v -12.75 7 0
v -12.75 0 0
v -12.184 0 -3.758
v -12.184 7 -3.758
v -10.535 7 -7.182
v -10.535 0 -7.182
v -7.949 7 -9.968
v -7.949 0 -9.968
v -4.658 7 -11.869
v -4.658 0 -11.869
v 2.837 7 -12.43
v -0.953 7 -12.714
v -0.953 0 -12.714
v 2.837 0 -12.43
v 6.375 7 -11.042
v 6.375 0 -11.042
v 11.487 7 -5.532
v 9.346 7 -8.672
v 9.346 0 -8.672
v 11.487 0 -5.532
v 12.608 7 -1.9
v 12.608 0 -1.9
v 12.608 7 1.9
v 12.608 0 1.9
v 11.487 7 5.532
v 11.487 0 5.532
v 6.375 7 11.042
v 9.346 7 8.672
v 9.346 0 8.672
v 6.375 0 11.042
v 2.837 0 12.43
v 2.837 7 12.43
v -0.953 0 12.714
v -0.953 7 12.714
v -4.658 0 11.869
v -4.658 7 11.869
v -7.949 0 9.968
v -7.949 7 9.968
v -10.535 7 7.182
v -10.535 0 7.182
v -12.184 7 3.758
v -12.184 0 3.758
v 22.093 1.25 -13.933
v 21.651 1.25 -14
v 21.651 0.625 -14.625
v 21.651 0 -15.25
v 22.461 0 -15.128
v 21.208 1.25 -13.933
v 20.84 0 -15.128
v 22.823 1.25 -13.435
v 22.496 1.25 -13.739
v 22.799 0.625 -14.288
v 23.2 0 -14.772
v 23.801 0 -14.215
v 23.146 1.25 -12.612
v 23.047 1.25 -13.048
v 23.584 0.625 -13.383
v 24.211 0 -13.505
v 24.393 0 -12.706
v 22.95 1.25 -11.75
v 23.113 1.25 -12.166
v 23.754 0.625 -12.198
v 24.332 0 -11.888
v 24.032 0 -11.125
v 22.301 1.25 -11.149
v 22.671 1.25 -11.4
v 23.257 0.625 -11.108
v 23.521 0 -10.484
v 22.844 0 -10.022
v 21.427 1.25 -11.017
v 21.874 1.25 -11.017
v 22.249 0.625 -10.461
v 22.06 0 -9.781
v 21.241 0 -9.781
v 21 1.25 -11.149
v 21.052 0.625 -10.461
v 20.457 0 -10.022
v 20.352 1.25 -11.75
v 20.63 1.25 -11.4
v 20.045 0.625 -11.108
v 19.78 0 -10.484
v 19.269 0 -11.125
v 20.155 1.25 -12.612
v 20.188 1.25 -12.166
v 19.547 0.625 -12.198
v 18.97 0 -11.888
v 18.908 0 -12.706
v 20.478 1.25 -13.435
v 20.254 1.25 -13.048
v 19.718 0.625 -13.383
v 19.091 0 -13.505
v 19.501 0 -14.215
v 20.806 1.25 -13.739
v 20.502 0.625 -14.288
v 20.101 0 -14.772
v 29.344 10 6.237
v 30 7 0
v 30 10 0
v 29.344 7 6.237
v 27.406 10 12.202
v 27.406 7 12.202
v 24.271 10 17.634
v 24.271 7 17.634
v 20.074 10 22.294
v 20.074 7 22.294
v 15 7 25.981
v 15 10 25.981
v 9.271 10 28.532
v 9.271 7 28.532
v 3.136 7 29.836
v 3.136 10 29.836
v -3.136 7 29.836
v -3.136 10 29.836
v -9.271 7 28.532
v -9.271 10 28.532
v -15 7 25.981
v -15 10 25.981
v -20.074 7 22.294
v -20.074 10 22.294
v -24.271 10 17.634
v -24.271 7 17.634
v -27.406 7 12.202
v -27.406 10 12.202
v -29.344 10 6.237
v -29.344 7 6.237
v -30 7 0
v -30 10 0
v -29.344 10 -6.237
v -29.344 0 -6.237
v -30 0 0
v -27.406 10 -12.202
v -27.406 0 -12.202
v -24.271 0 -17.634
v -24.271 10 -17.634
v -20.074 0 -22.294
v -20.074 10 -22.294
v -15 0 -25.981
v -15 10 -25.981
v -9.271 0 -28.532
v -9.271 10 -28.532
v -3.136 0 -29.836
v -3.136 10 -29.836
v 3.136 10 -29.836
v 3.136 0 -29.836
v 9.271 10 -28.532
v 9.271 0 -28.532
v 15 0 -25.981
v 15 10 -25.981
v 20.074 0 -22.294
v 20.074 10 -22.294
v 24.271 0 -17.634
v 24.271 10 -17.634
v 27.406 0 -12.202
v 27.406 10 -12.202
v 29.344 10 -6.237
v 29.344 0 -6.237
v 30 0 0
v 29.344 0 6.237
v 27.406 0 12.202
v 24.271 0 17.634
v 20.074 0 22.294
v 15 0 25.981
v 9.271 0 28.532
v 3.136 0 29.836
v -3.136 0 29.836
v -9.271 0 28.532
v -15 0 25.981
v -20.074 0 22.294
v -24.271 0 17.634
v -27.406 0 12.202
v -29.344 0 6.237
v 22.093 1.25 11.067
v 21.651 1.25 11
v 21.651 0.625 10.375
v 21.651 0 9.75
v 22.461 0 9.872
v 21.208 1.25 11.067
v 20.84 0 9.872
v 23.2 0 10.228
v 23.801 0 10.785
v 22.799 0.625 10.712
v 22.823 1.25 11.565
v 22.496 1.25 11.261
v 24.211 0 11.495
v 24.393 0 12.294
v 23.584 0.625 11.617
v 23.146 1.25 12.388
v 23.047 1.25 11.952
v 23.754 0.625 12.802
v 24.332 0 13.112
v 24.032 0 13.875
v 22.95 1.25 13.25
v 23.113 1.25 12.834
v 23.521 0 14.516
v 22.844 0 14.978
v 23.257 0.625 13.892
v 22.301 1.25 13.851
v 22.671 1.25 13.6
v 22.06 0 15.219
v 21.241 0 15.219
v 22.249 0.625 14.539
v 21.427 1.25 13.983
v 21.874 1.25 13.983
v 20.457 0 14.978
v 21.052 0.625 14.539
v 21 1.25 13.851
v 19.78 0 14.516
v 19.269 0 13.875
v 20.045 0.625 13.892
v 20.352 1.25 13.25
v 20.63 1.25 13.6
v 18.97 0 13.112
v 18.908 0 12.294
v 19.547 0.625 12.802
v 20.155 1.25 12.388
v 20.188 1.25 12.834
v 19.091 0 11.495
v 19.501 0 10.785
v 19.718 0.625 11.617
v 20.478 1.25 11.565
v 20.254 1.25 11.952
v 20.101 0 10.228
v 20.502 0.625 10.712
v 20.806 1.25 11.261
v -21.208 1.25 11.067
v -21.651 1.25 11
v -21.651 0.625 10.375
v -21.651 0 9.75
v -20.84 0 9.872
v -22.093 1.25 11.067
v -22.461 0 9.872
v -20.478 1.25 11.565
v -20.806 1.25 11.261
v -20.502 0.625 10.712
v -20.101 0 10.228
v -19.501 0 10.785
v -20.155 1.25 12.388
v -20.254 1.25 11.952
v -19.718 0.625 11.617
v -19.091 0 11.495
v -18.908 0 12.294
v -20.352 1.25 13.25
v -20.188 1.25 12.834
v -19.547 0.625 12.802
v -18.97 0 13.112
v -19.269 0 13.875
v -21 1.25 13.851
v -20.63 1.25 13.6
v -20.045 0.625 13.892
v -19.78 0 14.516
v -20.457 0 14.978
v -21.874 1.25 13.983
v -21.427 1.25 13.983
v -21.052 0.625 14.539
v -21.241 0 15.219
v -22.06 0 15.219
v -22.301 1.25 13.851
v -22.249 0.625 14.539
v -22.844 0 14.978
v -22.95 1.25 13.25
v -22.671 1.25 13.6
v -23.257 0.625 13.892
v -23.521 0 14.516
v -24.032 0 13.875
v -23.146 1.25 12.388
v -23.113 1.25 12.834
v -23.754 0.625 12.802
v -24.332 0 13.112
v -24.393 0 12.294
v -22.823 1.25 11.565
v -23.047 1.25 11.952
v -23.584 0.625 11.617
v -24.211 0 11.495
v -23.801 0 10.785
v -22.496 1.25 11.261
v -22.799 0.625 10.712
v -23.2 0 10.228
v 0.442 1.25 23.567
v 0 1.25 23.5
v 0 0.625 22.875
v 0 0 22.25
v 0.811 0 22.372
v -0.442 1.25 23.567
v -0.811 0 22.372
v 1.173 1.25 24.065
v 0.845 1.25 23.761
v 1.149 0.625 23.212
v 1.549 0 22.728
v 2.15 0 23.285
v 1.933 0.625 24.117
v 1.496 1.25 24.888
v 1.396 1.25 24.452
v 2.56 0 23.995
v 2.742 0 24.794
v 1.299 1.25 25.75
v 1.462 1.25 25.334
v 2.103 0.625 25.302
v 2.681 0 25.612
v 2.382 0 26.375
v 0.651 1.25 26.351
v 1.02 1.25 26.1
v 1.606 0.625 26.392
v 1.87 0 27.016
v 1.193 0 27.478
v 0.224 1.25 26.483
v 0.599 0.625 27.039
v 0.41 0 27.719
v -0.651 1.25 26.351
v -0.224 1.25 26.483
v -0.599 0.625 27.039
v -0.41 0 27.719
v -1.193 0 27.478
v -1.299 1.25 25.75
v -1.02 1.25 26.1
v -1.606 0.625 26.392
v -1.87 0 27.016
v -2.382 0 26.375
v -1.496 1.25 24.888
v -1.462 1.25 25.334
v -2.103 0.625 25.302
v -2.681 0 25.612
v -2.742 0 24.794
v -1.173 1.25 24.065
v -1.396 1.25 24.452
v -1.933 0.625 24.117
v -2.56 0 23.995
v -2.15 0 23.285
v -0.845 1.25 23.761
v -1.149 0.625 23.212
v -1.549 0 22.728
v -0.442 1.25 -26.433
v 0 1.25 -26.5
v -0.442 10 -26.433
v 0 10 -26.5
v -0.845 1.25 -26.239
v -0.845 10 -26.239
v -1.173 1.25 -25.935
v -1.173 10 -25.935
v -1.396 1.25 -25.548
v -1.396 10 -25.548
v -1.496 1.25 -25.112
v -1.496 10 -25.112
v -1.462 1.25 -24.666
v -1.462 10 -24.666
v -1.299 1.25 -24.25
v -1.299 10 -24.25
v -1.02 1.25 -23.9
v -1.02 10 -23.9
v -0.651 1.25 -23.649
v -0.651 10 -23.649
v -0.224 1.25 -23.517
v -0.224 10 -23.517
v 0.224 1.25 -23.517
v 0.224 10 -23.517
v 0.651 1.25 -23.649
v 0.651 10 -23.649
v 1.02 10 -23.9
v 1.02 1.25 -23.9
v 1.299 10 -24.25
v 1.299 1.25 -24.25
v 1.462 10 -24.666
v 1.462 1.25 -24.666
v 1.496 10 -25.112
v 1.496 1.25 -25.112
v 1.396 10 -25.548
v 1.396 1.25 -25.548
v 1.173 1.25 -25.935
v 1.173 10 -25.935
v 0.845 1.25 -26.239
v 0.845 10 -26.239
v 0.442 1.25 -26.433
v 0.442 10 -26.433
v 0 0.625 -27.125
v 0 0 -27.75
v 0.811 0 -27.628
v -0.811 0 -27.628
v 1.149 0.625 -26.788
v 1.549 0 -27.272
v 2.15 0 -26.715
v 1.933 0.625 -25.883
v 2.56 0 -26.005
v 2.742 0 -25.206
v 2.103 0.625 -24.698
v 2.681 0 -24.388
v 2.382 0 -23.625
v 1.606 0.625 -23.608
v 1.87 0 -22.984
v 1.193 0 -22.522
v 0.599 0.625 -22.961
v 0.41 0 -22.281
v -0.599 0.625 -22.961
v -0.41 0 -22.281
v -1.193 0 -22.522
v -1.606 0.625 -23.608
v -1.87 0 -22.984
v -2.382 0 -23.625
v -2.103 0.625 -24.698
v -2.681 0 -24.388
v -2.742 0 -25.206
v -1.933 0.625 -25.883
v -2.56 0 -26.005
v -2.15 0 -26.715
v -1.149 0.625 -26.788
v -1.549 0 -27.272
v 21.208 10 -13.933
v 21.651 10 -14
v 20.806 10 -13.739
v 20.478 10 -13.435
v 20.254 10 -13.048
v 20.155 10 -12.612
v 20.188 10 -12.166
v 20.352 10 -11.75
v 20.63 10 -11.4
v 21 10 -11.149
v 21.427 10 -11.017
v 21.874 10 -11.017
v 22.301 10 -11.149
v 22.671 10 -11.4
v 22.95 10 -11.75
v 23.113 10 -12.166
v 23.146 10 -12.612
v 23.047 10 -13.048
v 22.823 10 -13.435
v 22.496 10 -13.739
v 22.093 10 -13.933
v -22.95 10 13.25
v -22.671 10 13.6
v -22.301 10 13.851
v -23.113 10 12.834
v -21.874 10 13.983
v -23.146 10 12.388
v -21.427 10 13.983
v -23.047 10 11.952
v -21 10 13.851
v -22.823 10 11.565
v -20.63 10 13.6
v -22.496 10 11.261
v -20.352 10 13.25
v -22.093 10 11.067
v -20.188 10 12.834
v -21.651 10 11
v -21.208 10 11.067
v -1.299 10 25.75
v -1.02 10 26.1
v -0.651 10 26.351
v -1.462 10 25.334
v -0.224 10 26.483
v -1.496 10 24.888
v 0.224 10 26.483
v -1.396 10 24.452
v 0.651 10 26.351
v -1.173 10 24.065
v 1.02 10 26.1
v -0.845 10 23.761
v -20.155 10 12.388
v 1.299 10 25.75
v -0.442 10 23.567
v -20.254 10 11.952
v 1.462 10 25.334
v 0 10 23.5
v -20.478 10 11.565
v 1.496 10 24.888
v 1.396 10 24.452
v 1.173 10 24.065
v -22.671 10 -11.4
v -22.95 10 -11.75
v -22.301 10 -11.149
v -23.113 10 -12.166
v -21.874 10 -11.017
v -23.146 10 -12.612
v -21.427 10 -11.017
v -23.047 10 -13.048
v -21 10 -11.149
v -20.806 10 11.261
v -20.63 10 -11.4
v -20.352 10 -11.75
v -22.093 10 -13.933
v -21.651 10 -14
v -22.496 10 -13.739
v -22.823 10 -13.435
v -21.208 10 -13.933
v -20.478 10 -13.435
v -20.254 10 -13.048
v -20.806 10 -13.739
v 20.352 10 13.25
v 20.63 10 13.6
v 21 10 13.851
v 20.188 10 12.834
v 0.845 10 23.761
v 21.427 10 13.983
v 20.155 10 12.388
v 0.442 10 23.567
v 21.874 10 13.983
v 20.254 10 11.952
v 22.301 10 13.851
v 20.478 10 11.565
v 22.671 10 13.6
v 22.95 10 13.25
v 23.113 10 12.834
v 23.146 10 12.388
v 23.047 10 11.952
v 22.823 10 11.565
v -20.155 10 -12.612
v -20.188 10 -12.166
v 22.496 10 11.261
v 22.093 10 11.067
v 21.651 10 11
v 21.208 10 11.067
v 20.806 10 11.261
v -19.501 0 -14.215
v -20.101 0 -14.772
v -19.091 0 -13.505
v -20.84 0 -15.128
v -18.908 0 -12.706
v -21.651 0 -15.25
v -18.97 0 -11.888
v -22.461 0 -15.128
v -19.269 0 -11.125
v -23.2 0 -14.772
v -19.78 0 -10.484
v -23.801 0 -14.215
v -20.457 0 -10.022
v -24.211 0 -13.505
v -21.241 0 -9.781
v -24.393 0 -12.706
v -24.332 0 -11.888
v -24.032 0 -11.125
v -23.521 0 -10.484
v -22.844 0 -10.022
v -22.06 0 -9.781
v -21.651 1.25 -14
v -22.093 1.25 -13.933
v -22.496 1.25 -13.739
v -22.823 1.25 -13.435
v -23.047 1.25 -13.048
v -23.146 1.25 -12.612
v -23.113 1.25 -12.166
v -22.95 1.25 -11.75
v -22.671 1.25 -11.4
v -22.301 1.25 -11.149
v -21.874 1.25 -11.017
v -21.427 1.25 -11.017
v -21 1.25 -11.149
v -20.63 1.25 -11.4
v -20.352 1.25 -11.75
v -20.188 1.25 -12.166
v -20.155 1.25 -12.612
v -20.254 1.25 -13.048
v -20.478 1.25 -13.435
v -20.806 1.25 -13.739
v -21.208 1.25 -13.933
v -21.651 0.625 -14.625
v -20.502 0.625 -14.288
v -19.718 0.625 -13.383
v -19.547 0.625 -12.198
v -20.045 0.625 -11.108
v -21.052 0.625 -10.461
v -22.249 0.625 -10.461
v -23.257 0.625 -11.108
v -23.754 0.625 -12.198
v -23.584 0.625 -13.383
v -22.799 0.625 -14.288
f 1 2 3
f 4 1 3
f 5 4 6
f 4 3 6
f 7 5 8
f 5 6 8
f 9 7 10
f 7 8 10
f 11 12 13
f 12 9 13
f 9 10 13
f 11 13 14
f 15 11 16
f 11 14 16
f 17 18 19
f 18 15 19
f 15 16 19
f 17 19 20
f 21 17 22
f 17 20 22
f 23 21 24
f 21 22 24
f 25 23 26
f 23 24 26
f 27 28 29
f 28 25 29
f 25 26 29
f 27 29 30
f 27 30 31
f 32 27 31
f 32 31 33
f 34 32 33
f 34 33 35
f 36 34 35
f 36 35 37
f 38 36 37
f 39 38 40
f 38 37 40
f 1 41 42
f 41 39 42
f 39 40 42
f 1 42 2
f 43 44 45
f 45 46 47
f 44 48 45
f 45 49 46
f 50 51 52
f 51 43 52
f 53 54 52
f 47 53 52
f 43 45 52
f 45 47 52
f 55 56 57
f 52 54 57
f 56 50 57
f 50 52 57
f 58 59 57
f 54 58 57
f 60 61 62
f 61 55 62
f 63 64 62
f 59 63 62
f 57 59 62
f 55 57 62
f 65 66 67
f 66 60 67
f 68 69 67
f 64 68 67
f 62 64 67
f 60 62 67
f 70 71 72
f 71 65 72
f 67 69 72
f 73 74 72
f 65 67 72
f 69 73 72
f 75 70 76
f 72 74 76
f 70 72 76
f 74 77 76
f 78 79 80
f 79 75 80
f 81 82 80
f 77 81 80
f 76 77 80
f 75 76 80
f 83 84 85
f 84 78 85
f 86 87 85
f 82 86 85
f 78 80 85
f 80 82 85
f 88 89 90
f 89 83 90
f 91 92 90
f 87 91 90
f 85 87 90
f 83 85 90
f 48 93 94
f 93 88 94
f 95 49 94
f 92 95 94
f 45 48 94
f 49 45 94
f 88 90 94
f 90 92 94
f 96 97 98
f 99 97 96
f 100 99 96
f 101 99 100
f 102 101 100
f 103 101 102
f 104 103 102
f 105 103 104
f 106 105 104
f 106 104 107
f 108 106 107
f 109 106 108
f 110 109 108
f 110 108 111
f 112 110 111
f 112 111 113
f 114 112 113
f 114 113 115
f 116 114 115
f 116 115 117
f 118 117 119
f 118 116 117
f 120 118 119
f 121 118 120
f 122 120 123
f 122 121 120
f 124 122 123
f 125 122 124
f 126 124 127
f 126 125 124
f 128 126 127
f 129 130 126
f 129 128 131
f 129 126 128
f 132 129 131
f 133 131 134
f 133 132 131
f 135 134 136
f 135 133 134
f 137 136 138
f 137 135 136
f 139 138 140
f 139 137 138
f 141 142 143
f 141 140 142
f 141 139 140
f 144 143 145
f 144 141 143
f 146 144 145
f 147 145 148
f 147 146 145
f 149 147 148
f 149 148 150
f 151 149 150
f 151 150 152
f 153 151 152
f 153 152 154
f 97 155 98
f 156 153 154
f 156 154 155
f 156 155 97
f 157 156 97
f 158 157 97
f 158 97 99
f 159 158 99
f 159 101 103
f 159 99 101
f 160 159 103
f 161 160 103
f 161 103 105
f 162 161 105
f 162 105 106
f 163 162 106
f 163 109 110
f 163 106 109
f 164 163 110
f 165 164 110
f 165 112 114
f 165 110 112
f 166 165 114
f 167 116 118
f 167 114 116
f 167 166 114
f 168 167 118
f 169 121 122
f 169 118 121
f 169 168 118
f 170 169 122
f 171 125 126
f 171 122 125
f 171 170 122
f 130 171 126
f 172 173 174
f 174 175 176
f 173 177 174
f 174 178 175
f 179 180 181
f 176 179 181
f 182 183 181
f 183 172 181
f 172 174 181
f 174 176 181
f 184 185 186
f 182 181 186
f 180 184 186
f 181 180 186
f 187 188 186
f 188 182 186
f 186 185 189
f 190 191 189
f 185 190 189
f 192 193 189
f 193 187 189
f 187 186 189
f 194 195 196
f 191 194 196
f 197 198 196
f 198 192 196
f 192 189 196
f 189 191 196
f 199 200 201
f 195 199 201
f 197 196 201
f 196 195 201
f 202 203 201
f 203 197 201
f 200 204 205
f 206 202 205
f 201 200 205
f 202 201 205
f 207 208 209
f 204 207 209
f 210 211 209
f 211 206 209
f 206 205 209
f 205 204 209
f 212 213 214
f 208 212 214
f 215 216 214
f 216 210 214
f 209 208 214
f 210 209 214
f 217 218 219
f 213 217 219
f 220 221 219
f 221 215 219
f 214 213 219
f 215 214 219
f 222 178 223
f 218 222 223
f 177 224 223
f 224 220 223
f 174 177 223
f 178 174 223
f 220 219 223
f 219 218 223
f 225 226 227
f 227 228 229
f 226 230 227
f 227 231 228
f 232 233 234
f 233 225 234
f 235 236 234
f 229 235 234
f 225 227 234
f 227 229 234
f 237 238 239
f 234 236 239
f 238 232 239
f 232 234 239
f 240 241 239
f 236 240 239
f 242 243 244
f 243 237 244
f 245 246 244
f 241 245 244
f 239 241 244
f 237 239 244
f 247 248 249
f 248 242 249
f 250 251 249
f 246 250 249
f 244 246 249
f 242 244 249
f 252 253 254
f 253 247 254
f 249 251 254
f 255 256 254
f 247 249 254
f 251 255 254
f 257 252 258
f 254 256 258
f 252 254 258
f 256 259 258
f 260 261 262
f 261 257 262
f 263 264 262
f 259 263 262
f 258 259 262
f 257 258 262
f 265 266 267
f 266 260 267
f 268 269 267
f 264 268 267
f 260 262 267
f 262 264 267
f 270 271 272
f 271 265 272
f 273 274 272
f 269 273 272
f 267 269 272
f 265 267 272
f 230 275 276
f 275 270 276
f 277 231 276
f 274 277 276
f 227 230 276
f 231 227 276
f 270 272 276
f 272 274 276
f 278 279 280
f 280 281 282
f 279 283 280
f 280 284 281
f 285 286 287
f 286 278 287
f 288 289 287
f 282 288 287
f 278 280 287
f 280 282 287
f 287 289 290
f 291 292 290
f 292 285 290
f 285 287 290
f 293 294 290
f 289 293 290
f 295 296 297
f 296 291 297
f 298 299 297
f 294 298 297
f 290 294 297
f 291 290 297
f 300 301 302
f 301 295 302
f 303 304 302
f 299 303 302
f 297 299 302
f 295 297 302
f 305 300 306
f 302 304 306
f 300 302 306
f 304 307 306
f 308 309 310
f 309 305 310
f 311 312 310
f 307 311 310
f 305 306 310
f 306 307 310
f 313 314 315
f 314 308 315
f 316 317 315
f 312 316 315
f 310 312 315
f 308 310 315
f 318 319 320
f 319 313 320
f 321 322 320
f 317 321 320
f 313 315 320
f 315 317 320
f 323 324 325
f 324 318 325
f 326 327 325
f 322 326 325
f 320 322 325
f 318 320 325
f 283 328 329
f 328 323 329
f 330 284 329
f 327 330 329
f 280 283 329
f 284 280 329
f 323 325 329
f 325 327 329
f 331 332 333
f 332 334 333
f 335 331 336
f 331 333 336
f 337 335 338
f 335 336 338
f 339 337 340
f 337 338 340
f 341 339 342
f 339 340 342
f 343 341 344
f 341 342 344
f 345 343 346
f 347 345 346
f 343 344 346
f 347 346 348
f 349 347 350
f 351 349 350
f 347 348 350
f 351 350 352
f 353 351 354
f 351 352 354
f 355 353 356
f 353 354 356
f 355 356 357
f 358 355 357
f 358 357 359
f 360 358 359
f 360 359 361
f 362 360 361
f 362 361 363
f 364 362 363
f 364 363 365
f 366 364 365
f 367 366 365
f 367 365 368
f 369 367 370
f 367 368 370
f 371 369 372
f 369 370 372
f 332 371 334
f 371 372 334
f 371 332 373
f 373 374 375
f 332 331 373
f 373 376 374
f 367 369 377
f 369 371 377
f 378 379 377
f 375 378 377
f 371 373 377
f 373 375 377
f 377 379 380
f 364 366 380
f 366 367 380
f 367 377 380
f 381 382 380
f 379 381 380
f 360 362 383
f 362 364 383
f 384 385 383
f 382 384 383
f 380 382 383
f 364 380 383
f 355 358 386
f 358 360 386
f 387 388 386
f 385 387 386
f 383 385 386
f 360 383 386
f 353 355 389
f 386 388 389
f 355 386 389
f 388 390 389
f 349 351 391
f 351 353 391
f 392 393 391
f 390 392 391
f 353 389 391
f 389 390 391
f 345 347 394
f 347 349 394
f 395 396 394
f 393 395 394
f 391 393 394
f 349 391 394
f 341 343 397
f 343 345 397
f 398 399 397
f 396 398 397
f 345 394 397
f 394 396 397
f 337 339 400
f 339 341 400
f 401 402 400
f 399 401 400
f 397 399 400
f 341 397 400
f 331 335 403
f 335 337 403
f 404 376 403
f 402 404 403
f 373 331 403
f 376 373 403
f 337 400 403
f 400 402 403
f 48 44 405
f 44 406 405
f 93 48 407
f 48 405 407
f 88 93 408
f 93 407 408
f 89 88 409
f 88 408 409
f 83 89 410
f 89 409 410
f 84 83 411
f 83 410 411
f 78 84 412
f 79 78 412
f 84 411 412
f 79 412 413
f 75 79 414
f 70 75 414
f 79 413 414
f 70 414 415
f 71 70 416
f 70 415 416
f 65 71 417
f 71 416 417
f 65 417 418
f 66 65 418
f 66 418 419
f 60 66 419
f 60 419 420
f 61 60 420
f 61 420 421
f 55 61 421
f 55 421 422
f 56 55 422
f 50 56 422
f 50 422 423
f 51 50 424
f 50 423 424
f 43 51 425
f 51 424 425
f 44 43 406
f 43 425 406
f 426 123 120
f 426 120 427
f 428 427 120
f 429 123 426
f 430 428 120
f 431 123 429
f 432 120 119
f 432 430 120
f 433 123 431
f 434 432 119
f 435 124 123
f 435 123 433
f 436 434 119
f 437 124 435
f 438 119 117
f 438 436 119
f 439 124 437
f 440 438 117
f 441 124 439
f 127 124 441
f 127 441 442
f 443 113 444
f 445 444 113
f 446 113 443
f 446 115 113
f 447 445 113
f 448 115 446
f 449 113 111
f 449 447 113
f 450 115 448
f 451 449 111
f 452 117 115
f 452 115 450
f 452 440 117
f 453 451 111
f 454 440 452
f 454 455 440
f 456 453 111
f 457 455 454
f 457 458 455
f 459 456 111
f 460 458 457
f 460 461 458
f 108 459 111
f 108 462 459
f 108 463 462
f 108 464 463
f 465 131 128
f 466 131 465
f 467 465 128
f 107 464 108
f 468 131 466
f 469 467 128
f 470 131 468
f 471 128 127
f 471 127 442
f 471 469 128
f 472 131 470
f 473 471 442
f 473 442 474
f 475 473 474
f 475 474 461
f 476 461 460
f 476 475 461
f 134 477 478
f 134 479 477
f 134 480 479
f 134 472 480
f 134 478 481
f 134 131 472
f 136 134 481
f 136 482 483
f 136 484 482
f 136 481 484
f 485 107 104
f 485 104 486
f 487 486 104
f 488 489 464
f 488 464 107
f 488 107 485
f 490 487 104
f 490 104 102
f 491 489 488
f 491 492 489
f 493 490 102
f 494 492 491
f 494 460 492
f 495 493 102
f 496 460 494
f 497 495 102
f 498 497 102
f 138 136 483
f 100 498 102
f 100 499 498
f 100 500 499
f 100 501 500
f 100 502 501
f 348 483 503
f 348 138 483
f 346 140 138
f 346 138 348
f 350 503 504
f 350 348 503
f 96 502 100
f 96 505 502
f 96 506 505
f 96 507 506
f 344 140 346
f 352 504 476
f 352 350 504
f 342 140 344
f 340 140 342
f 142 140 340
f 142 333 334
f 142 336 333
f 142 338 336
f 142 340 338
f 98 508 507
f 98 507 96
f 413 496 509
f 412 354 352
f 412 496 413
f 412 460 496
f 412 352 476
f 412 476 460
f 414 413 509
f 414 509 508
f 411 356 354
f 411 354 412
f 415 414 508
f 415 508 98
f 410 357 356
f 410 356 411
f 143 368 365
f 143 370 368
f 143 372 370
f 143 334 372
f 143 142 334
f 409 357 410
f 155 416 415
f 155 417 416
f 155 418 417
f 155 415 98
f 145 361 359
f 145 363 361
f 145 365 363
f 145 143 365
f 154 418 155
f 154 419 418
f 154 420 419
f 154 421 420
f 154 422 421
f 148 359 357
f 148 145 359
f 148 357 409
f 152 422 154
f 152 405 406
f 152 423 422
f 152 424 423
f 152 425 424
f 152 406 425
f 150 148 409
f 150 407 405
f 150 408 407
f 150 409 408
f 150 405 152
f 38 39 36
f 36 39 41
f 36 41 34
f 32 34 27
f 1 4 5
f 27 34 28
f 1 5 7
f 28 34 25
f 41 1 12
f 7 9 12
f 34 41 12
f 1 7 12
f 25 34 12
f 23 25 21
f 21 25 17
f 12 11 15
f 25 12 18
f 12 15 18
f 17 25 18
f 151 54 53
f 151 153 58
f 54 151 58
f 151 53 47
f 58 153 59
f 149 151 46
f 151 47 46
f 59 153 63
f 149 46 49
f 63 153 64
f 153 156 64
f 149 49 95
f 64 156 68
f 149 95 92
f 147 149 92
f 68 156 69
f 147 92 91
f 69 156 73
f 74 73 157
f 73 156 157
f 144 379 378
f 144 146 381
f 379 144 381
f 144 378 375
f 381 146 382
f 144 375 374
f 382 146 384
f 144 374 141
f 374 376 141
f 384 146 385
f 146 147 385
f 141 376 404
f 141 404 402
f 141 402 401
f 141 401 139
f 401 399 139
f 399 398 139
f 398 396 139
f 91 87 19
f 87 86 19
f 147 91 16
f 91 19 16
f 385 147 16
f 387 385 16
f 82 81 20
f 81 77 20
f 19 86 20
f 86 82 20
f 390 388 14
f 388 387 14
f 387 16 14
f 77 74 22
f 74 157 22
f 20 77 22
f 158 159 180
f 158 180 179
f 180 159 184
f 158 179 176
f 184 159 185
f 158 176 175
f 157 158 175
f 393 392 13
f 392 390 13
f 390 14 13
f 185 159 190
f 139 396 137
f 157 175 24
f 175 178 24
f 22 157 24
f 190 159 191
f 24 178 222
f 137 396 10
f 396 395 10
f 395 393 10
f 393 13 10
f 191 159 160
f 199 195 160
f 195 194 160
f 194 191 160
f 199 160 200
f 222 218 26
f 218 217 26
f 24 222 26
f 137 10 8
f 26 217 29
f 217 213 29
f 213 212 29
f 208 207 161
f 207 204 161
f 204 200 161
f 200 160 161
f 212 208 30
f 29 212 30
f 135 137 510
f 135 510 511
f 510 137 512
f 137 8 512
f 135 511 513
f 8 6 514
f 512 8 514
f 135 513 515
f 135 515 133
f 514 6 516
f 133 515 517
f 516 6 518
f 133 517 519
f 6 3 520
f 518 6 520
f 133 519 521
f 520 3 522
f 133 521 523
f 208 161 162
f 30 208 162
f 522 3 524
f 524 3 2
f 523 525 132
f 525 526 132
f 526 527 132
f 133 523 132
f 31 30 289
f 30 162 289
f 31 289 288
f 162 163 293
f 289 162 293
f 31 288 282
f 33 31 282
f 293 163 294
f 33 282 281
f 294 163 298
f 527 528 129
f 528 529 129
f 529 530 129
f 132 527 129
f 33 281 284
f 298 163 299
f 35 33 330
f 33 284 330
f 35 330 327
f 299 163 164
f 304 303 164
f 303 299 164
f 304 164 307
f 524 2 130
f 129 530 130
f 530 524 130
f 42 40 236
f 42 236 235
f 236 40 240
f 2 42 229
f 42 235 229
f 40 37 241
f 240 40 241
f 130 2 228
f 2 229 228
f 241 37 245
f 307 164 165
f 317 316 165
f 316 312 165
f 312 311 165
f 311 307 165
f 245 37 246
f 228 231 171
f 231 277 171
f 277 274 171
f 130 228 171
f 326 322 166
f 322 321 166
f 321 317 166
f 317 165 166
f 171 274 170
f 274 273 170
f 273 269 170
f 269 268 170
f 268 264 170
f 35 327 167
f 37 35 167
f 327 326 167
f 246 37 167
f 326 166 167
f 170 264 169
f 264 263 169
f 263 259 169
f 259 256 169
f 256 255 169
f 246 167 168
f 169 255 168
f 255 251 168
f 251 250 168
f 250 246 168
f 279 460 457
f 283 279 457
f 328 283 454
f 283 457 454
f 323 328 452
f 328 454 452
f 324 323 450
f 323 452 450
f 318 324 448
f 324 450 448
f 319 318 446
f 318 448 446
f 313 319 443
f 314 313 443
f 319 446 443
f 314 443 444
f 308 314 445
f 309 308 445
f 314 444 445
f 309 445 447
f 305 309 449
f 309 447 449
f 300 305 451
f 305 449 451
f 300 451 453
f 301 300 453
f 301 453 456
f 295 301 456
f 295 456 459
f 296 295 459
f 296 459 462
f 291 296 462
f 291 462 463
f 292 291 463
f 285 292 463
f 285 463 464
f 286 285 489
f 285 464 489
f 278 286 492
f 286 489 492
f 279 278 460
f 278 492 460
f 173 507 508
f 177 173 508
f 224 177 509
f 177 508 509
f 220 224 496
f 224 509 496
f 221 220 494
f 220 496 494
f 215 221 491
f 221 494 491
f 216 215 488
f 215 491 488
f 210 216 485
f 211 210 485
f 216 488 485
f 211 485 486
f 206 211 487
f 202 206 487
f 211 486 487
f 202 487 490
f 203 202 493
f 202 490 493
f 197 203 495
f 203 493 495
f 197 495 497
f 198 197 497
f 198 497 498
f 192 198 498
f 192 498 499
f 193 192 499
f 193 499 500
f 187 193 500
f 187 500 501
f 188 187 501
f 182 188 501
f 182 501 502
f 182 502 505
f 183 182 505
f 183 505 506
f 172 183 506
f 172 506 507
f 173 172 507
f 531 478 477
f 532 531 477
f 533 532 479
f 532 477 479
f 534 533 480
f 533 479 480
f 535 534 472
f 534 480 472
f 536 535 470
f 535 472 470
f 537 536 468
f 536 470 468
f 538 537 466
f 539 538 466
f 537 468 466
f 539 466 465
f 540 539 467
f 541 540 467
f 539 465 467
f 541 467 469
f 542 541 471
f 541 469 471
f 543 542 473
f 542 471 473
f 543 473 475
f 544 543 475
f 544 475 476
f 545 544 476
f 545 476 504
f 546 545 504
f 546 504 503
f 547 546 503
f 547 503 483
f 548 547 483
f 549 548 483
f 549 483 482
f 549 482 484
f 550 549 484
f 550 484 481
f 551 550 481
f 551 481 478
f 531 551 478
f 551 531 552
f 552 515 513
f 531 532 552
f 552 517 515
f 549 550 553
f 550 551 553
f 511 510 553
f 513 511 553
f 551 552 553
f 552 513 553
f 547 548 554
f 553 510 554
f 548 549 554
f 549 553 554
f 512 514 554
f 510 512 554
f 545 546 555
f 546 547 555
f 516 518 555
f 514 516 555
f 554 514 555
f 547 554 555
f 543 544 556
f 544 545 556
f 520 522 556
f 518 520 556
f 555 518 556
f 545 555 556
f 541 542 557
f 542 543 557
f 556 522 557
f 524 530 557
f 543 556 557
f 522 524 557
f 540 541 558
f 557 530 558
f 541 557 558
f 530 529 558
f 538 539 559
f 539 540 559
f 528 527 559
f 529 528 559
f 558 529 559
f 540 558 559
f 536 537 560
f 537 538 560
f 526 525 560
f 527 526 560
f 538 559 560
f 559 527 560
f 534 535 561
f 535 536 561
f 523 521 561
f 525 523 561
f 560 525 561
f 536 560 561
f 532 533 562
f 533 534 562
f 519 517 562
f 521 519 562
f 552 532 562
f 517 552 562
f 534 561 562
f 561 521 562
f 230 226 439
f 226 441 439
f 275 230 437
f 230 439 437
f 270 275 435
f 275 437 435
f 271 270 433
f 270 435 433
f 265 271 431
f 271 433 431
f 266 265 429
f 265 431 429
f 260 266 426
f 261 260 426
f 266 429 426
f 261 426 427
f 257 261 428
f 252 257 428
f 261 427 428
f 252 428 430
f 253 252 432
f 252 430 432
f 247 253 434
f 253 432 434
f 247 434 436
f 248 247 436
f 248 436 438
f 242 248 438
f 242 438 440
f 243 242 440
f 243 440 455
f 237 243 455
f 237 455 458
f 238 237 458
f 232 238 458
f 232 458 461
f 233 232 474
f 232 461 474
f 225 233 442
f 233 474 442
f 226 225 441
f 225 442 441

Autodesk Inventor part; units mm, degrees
ref_plane "YZ Plane" through (0, 0, 0) normal (1, 0, 0) x (0, 1, 0)
ref_plane "XZ Plane" through (0, 0, 0) normal (0, 1, 0) x (-1, 0, 0)
ref_plane "XY Plane" through (0, 0, 0) normal (0, 0, 1) x (1, 0, 0)
sketch "Sketch1" plane through (0, 0, 0) normal (0, 1, 0) x (-1, 0, 0)
  circle A0 centre (0, 0) radius 12.75
  circle A1 centre (0, 0) radius 30
  dimension "d0" = 25.5
  dimension "d1" = 60
extrude "Extrusion1" add sketch "Sketch1" along normal blind 7
sketch "Sketch2" plane through (0, 7, 0) normal (0, 1, 0) x (1, 0, 0)
  circle A0 centre (0, 0) radius 30
extrude "Extrusion2" add sketch "Sketch2" along normal blind 3
sketch "Sketch3" plane through (0, 0, 0) normal (0, -1, 0) x (1, 0, 0)
  circle A0 centre (0, 0) radius 30 projected
  line L0 (0, 30) -> (0, 25)
  point P0 (-21.6506, 12.5)
  point P1 (-21.6506, -12.5)
  point P2 (0, -25)
  point P3 (21.6506, -12.5)
  point P4 (21.6506, 12.5)
  dimension "d6" = 5
  dimension "d9" = 360
hole "Hole1" at (0, 0, 25) at (-21.6506, 0, 12.5) at (-21.6506, 0, -12.5) at (0, 0, -25) at (21.6506, 0, -12.5) at (21.6506, 0, 12.5) direction (0, 1, 0) diameter 3 end through all countersink diameter 5.5 countersink angle 90
properties part number "Base_To_First_Tilt_Attachment"
